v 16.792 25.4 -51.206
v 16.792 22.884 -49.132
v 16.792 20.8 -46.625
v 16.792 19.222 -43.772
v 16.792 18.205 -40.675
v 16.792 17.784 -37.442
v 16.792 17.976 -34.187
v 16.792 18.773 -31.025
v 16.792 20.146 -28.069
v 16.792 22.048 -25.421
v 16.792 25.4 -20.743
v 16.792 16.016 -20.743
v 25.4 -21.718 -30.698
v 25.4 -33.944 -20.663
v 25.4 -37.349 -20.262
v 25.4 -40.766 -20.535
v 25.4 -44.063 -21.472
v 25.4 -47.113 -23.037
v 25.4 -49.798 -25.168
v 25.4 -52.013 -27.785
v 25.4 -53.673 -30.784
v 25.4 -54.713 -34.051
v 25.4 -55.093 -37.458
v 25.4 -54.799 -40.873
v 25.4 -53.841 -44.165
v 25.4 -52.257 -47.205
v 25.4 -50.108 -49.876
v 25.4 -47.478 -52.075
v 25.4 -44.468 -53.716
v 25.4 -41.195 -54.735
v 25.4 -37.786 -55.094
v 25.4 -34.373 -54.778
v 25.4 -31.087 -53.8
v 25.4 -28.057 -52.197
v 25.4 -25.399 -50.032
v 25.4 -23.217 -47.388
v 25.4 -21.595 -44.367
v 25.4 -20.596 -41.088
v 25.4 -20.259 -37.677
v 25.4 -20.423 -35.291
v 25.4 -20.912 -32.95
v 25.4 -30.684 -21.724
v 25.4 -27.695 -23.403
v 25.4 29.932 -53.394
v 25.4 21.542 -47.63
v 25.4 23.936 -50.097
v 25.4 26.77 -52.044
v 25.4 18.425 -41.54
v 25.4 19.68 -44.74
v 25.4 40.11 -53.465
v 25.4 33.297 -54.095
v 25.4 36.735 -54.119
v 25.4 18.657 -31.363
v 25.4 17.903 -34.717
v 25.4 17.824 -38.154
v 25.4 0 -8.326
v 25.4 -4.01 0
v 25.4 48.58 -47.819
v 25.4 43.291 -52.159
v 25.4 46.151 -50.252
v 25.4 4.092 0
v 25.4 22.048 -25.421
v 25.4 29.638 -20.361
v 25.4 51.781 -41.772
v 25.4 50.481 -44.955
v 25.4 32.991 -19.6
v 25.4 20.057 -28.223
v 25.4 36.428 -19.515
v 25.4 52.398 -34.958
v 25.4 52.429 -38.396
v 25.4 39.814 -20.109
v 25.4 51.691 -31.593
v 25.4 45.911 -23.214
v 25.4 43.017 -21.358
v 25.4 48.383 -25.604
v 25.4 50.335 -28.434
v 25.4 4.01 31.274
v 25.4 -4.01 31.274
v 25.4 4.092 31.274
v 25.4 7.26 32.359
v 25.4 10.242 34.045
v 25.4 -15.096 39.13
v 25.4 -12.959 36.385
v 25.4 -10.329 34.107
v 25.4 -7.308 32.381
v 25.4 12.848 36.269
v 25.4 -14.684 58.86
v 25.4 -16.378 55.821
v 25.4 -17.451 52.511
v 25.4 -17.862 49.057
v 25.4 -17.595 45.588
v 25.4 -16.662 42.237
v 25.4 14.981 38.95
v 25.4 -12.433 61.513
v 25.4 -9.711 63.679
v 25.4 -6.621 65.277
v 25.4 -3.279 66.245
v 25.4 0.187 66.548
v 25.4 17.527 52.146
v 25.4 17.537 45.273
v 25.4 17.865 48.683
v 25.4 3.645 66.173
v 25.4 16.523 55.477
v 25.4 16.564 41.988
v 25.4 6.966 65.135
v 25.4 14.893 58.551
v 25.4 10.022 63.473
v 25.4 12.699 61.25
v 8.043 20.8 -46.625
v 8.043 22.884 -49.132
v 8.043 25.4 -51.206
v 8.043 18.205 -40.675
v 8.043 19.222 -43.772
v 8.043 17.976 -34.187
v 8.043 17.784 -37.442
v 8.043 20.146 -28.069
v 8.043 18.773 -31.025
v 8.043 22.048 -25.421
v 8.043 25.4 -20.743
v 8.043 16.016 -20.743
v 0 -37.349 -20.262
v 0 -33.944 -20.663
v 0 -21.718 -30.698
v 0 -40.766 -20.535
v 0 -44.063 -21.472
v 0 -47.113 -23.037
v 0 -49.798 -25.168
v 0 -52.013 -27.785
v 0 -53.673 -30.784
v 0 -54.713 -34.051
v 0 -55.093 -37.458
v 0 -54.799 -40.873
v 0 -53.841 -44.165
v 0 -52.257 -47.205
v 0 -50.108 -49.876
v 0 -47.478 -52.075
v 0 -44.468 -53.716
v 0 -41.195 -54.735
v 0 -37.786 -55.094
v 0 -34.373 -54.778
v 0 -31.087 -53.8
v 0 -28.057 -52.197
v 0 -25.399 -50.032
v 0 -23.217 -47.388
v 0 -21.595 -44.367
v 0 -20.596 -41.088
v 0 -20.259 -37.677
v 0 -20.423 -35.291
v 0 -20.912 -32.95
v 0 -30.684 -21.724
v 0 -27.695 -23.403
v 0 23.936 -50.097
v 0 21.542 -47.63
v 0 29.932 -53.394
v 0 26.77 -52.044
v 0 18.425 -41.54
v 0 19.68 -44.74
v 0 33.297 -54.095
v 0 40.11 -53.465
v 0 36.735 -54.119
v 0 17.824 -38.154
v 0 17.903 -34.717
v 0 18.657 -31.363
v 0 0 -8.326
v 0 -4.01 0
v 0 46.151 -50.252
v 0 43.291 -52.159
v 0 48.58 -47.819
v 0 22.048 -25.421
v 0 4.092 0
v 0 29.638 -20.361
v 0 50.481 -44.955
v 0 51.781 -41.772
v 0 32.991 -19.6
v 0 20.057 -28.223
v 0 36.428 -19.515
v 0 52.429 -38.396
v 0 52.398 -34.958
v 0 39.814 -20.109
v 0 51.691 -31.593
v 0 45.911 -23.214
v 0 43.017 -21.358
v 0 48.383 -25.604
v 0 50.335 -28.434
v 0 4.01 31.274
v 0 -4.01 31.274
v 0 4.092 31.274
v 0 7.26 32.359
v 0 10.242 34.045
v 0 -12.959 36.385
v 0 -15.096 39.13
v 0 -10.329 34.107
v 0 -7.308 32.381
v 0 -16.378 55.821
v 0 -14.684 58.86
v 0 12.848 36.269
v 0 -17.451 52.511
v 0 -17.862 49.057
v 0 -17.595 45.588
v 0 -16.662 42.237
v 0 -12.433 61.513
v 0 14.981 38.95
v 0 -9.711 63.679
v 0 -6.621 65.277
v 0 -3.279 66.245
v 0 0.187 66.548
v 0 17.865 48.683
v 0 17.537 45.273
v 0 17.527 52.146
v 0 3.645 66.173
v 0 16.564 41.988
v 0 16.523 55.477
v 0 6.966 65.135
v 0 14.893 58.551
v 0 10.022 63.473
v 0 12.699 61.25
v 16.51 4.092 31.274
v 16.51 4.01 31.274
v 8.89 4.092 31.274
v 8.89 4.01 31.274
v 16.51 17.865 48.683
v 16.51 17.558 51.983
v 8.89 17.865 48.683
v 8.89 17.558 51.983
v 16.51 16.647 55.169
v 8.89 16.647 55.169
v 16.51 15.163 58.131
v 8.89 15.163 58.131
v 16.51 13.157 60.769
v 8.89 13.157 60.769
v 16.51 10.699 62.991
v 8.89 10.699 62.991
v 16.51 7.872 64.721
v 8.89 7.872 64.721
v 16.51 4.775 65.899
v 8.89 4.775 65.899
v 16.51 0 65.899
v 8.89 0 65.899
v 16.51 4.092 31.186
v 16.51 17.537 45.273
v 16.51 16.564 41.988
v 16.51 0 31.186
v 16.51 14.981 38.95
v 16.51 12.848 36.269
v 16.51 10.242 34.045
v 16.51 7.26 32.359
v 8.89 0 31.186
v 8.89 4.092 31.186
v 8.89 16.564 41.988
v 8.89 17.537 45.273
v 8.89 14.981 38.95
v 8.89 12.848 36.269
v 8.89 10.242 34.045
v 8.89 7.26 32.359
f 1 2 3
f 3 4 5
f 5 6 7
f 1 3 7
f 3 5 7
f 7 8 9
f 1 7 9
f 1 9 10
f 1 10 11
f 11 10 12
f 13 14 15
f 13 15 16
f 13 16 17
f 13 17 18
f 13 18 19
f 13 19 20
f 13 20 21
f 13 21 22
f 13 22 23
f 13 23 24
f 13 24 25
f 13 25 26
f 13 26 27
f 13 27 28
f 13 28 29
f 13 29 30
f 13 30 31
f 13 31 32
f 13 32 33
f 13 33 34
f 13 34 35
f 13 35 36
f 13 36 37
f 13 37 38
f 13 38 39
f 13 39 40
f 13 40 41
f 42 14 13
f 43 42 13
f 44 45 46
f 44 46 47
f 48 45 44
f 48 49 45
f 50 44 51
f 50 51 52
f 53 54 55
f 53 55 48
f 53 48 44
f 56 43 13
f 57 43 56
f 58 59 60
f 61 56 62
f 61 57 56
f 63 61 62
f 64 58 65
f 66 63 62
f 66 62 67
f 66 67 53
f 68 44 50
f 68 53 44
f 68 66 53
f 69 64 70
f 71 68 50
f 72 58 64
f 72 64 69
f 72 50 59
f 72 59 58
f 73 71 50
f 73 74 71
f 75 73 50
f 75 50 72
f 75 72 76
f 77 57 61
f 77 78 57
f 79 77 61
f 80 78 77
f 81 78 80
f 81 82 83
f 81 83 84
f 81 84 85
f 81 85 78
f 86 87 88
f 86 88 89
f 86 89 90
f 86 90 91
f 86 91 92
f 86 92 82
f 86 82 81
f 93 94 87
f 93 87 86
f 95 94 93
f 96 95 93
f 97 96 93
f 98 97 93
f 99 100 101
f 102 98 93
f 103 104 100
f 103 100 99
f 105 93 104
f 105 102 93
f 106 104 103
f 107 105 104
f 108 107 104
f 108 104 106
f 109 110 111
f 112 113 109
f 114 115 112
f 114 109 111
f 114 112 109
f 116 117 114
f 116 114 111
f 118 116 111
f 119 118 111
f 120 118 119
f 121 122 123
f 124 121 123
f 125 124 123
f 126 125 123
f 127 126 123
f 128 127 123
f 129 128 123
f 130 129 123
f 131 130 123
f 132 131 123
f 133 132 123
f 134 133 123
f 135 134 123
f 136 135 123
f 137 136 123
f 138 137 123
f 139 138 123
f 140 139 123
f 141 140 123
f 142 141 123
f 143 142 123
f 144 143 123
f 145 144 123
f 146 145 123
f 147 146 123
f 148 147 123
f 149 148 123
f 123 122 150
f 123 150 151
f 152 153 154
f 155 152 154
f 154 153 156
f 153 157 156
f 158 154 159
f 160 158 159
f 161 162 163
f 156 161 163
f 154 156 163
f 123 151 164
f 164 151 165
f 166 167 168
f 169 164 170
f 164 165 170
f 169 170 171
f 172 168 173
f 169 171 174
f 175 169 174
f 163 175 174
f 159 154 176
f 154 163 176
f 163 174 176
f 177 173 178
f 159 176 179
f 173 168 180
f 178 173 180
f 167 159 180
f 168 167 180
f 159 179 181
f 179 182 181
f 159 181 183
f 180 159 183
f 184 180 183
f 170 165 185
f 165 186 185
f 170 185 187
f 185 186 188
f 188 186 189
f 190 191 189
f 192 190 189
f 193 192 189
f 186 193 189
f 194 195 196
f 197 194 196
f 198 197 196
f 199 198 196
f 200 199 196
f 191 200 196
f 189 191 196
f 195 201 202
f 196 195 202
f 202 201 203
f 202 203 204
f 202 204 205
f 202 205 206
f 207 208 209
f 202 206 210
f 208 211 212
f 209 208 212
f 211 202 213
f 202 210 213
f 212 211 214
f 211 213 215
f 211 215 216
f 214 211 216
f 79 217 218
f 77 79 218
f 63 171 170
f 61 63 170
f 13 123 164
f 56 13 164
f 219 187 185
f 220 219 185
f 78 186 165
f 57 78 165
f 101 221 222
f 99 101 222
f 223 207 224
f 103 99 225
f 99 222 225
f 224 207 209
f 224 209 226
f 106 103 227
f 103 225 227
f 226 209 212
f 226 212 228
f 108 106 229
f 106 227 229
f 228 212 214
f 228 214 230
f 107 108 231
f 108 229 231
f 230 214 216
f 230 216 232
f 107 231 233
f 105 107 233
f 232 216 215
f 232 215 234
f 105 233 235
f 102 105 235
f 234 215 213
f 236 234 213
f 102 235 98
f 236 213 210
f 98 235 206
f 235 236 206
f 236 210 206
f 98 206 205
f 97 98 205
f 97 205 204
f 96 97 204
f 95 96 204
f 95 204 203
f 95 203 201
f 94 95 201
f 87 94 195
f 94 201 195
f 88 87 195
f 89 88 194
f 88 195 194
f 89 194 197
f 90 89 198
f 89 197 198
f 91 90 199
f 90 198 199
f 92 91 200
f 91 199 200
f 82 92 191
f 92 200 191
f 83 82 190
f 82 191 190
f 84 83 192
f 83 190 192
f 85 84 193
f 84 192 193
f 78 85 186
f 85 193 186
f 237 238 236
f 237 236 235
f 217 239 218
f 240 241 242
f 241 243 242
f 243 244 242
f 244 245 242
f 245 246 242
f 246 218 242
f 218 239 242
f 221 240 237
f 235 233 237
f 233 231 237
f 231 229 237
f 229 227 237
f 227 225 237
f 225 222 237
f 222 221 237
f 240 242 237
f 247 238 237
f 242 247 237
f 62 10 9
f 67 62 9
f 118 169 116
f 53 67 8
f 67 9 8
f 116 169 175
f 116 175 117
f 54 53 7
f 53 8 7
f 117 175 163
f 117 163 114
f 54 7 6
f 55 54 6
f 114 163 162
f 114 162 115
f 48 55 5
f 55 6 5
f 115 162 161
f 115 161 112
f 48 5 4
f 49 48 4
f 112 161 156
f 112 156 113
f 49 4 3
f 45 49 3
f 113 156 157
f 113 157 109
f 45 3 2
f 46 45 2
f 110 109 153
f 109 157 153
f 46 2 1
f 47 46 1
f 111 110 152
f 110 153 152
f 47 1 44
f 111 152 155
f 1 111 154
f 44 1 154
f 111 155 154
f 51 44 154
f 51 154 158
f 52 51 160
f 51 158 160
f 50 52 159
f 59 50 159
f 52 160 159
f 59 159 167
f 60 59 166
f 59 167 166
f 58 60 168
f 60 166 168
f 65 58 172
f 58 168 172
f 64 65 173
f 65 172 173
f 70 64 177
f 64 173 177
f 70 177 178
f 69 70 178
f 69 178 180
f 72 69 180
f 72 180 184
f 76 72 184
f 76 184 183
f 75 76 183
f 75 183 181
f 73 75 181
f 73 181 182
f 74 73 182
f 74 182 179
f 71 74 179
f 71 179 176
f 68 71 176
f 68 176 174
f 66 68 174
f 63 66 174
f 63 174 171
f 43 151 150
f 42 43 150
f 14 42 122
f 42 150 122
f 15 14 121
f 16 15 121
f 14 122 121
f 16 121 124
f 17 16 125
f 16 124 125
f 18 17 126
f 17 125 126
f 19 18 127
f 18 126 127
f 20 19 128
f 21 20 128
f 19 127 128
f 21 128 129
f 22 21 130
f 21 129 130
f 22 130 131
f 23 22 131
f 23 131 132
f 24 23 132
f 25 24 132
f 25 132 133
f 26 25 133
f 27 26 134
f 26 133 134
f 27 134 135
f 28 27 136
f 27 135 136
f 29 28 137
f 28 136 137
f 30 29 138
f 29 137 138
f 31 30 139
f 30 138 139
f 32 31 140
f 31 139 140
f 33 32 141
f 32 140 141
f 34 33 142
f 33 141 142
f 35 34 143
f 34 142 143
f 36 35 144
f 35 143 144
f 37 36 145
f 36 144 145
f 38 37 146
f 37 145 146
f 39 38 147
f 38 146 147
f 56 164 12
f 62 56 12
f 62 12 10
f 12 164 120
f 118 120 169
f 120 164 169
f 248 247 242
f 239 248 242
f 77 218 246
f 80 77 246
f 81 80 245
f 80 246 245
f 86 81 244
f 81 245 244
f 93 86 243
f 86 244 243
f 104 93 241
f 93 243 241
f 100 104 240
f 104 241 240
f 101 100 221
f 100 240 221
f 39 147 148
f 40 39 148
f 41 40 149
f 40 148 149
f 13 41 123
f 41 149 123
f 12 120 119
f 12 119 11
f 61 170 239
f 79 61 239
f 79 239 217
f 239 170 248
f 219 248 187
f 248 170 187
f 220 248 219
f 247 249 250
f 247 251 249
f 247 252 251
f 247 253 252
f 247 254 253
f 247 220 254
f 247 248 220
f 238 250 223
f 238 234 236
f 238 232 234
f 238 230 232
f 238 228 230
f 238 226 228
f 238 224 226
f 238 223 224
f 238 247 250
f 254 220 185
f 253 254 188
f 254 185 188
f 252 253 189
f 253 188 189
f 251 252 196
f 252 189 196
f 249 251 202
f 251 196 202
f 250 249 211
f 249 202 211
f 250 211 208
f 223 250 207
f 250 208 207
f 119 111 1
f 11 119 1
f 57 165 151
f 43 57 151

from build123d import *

# Parameters (mm, degrees)
F1_DEPTH = 25.4
F2_W     = 7.6199993491
F2_H     = 34.71333161
F2_W_2   = 8.7488871068
F2_H_2   = 34.4311110675
F3_DEPTH = 25.4
F4_DEPTH = 25.4
F5_DEPTH = 25.4


with BuildPart() as f1:
    # F0 (on Right) → F1 (new body)
    with BuildSketch(Plane.YZ):
        with BuildLine():
            ThreePointArc((4.0102475369, 31.2737714921), (13.9789110295, 37.5583620793), (17.8654682829, 48.683334142))
            ThreePointArc((17.8654682829, 48.683334142), (-11.1249720627, 62.6622451715), (-4.0102475369, 31.2737714921))
            Line((-4.0102475369, 31.2737714921), (4.0102475369, 31.2737714921))
        make_face()
        with BuildLine():
            Line((4.0102475369, 31.2737714921), (-4.0102475369, 31.2737714921))
            ThreePointArc((-4.0102475369, 31.2737714921), (0, 30.8178658591), (4.0102475369, 31.2737714921))
        make_face()
        with BuildLine():
            ThreePointArc((4.0102475369, 31.2737714921), (0, 30.8178658591), (-4.0102475369, 31.2737714921))
            Line((-4.0102475369, 31.2737714921), (-4.0102475369, 0))
            Line((-4.0102475369, 0), (4.0922206827, 0))
            Line((4.0922206827, 0), (4.0922206827, 31.2737714921))
            Line((4.0922206827, 31.2737714921), (4.0102475369, 31.2737714921))
        make_face()
        with BuildLine():
            Line((4.0922206827, 0), (-4.0102475369, 0))
            Line((-4.0102475369, 0), (-27.6950067122, -23.4025270809))
            ThreePointArc((-27.6950067122, -23.4025270809), (-24.2033996069, -26.6378410284), (-21.7180567466, -30.6976005513))
            Line((-21.7180567466, -30.6976005513), (0, -8.3255562931))
            Line((0, -8.3255562931), (22.0484417187, -25.4207379206))
            ThreePointArc((22.0484417187, -25.4207379206), (25.5051095185, -22.3833397186), (29.6382622048, -20.3606215012))
            Line((29.6382622048, -20.3606215012), (4.0922206827, 0))
        make_face()
        with BuildLine():
            ThreePointArc((-21.7180567466, -30.6976005513), (-24.2033996069, -26.6378410284), (-27.6950067122, -23.4025270809))
            ThreePointArc((-27.6950067122, -23.4025270809), (-53.1240683212, -45.7241699015), (-20.2587280311, -37.6766659319))
            ThreePointArc((-20.2587280311, -37.6766659319), (-20.6274632454, -34.11166264), (-21.7180567466, -30.6976005513))
        make_face()
        with BuildLine():
            ThreePointArc((52.4996409272, -36.8300005794), (45.2856622606, -22.7420351096), (29.6382622048, -20.3606215012))
            ThreePointArc((29.6382622048, -20.3606215012), (25.5051095185, -22.3833397186), (22.0484417187, -25.4207379206))
            ThreePointArc((22.0484417187, -25.4207379206), (29.0447706115, -53.0892041857), (52.4996409272, -36.8300005794))
        make_face()
    extrude(amount=F1_DEPTH)

    # F2 (on Front) → F3 (cut)
    with BuildSketch(Plane.XZ):
        with Locations((12.6999989152, 48.5422220081)):
            Rectangle(F2_W, F2_H)
        with Locations((12.4177793041, -37.958888337)):
            Rectangle(F2_W_2, F2_H_2)
    extrude(amount=-F3_DEPTH, mode=Mode.SUBTRACT)

    # F2 (on Front) → F4 (cut)
    with BuildSketch(Plane.XZ):
        with Locations((12.6999989152, 48.5422220081)):
            Rectangle(F2_W, F2_H)
        with Locations((12.4177793041, -37.958888337)):
            Rectangle(F2_W_2, F2_H_2)
    extrude(amount=-F4_DEPTH, mode=Mode.SUBTRACT)

    # F2 (on Front) → F5 (cut)
    with BuildSketch(Plane.XZ):
        with Locations((12.6999989152, 48.5422220081)):
            Rectangle(F2_W, F2_H)
        with Locations((12.4177793041, -37.958888337)):
            Rectangle(F2_W_2, F2_H_2)
    extrude(amount=-F5_DEPTH, mode=Mode.SUBTRACT)


solid = f1.part
